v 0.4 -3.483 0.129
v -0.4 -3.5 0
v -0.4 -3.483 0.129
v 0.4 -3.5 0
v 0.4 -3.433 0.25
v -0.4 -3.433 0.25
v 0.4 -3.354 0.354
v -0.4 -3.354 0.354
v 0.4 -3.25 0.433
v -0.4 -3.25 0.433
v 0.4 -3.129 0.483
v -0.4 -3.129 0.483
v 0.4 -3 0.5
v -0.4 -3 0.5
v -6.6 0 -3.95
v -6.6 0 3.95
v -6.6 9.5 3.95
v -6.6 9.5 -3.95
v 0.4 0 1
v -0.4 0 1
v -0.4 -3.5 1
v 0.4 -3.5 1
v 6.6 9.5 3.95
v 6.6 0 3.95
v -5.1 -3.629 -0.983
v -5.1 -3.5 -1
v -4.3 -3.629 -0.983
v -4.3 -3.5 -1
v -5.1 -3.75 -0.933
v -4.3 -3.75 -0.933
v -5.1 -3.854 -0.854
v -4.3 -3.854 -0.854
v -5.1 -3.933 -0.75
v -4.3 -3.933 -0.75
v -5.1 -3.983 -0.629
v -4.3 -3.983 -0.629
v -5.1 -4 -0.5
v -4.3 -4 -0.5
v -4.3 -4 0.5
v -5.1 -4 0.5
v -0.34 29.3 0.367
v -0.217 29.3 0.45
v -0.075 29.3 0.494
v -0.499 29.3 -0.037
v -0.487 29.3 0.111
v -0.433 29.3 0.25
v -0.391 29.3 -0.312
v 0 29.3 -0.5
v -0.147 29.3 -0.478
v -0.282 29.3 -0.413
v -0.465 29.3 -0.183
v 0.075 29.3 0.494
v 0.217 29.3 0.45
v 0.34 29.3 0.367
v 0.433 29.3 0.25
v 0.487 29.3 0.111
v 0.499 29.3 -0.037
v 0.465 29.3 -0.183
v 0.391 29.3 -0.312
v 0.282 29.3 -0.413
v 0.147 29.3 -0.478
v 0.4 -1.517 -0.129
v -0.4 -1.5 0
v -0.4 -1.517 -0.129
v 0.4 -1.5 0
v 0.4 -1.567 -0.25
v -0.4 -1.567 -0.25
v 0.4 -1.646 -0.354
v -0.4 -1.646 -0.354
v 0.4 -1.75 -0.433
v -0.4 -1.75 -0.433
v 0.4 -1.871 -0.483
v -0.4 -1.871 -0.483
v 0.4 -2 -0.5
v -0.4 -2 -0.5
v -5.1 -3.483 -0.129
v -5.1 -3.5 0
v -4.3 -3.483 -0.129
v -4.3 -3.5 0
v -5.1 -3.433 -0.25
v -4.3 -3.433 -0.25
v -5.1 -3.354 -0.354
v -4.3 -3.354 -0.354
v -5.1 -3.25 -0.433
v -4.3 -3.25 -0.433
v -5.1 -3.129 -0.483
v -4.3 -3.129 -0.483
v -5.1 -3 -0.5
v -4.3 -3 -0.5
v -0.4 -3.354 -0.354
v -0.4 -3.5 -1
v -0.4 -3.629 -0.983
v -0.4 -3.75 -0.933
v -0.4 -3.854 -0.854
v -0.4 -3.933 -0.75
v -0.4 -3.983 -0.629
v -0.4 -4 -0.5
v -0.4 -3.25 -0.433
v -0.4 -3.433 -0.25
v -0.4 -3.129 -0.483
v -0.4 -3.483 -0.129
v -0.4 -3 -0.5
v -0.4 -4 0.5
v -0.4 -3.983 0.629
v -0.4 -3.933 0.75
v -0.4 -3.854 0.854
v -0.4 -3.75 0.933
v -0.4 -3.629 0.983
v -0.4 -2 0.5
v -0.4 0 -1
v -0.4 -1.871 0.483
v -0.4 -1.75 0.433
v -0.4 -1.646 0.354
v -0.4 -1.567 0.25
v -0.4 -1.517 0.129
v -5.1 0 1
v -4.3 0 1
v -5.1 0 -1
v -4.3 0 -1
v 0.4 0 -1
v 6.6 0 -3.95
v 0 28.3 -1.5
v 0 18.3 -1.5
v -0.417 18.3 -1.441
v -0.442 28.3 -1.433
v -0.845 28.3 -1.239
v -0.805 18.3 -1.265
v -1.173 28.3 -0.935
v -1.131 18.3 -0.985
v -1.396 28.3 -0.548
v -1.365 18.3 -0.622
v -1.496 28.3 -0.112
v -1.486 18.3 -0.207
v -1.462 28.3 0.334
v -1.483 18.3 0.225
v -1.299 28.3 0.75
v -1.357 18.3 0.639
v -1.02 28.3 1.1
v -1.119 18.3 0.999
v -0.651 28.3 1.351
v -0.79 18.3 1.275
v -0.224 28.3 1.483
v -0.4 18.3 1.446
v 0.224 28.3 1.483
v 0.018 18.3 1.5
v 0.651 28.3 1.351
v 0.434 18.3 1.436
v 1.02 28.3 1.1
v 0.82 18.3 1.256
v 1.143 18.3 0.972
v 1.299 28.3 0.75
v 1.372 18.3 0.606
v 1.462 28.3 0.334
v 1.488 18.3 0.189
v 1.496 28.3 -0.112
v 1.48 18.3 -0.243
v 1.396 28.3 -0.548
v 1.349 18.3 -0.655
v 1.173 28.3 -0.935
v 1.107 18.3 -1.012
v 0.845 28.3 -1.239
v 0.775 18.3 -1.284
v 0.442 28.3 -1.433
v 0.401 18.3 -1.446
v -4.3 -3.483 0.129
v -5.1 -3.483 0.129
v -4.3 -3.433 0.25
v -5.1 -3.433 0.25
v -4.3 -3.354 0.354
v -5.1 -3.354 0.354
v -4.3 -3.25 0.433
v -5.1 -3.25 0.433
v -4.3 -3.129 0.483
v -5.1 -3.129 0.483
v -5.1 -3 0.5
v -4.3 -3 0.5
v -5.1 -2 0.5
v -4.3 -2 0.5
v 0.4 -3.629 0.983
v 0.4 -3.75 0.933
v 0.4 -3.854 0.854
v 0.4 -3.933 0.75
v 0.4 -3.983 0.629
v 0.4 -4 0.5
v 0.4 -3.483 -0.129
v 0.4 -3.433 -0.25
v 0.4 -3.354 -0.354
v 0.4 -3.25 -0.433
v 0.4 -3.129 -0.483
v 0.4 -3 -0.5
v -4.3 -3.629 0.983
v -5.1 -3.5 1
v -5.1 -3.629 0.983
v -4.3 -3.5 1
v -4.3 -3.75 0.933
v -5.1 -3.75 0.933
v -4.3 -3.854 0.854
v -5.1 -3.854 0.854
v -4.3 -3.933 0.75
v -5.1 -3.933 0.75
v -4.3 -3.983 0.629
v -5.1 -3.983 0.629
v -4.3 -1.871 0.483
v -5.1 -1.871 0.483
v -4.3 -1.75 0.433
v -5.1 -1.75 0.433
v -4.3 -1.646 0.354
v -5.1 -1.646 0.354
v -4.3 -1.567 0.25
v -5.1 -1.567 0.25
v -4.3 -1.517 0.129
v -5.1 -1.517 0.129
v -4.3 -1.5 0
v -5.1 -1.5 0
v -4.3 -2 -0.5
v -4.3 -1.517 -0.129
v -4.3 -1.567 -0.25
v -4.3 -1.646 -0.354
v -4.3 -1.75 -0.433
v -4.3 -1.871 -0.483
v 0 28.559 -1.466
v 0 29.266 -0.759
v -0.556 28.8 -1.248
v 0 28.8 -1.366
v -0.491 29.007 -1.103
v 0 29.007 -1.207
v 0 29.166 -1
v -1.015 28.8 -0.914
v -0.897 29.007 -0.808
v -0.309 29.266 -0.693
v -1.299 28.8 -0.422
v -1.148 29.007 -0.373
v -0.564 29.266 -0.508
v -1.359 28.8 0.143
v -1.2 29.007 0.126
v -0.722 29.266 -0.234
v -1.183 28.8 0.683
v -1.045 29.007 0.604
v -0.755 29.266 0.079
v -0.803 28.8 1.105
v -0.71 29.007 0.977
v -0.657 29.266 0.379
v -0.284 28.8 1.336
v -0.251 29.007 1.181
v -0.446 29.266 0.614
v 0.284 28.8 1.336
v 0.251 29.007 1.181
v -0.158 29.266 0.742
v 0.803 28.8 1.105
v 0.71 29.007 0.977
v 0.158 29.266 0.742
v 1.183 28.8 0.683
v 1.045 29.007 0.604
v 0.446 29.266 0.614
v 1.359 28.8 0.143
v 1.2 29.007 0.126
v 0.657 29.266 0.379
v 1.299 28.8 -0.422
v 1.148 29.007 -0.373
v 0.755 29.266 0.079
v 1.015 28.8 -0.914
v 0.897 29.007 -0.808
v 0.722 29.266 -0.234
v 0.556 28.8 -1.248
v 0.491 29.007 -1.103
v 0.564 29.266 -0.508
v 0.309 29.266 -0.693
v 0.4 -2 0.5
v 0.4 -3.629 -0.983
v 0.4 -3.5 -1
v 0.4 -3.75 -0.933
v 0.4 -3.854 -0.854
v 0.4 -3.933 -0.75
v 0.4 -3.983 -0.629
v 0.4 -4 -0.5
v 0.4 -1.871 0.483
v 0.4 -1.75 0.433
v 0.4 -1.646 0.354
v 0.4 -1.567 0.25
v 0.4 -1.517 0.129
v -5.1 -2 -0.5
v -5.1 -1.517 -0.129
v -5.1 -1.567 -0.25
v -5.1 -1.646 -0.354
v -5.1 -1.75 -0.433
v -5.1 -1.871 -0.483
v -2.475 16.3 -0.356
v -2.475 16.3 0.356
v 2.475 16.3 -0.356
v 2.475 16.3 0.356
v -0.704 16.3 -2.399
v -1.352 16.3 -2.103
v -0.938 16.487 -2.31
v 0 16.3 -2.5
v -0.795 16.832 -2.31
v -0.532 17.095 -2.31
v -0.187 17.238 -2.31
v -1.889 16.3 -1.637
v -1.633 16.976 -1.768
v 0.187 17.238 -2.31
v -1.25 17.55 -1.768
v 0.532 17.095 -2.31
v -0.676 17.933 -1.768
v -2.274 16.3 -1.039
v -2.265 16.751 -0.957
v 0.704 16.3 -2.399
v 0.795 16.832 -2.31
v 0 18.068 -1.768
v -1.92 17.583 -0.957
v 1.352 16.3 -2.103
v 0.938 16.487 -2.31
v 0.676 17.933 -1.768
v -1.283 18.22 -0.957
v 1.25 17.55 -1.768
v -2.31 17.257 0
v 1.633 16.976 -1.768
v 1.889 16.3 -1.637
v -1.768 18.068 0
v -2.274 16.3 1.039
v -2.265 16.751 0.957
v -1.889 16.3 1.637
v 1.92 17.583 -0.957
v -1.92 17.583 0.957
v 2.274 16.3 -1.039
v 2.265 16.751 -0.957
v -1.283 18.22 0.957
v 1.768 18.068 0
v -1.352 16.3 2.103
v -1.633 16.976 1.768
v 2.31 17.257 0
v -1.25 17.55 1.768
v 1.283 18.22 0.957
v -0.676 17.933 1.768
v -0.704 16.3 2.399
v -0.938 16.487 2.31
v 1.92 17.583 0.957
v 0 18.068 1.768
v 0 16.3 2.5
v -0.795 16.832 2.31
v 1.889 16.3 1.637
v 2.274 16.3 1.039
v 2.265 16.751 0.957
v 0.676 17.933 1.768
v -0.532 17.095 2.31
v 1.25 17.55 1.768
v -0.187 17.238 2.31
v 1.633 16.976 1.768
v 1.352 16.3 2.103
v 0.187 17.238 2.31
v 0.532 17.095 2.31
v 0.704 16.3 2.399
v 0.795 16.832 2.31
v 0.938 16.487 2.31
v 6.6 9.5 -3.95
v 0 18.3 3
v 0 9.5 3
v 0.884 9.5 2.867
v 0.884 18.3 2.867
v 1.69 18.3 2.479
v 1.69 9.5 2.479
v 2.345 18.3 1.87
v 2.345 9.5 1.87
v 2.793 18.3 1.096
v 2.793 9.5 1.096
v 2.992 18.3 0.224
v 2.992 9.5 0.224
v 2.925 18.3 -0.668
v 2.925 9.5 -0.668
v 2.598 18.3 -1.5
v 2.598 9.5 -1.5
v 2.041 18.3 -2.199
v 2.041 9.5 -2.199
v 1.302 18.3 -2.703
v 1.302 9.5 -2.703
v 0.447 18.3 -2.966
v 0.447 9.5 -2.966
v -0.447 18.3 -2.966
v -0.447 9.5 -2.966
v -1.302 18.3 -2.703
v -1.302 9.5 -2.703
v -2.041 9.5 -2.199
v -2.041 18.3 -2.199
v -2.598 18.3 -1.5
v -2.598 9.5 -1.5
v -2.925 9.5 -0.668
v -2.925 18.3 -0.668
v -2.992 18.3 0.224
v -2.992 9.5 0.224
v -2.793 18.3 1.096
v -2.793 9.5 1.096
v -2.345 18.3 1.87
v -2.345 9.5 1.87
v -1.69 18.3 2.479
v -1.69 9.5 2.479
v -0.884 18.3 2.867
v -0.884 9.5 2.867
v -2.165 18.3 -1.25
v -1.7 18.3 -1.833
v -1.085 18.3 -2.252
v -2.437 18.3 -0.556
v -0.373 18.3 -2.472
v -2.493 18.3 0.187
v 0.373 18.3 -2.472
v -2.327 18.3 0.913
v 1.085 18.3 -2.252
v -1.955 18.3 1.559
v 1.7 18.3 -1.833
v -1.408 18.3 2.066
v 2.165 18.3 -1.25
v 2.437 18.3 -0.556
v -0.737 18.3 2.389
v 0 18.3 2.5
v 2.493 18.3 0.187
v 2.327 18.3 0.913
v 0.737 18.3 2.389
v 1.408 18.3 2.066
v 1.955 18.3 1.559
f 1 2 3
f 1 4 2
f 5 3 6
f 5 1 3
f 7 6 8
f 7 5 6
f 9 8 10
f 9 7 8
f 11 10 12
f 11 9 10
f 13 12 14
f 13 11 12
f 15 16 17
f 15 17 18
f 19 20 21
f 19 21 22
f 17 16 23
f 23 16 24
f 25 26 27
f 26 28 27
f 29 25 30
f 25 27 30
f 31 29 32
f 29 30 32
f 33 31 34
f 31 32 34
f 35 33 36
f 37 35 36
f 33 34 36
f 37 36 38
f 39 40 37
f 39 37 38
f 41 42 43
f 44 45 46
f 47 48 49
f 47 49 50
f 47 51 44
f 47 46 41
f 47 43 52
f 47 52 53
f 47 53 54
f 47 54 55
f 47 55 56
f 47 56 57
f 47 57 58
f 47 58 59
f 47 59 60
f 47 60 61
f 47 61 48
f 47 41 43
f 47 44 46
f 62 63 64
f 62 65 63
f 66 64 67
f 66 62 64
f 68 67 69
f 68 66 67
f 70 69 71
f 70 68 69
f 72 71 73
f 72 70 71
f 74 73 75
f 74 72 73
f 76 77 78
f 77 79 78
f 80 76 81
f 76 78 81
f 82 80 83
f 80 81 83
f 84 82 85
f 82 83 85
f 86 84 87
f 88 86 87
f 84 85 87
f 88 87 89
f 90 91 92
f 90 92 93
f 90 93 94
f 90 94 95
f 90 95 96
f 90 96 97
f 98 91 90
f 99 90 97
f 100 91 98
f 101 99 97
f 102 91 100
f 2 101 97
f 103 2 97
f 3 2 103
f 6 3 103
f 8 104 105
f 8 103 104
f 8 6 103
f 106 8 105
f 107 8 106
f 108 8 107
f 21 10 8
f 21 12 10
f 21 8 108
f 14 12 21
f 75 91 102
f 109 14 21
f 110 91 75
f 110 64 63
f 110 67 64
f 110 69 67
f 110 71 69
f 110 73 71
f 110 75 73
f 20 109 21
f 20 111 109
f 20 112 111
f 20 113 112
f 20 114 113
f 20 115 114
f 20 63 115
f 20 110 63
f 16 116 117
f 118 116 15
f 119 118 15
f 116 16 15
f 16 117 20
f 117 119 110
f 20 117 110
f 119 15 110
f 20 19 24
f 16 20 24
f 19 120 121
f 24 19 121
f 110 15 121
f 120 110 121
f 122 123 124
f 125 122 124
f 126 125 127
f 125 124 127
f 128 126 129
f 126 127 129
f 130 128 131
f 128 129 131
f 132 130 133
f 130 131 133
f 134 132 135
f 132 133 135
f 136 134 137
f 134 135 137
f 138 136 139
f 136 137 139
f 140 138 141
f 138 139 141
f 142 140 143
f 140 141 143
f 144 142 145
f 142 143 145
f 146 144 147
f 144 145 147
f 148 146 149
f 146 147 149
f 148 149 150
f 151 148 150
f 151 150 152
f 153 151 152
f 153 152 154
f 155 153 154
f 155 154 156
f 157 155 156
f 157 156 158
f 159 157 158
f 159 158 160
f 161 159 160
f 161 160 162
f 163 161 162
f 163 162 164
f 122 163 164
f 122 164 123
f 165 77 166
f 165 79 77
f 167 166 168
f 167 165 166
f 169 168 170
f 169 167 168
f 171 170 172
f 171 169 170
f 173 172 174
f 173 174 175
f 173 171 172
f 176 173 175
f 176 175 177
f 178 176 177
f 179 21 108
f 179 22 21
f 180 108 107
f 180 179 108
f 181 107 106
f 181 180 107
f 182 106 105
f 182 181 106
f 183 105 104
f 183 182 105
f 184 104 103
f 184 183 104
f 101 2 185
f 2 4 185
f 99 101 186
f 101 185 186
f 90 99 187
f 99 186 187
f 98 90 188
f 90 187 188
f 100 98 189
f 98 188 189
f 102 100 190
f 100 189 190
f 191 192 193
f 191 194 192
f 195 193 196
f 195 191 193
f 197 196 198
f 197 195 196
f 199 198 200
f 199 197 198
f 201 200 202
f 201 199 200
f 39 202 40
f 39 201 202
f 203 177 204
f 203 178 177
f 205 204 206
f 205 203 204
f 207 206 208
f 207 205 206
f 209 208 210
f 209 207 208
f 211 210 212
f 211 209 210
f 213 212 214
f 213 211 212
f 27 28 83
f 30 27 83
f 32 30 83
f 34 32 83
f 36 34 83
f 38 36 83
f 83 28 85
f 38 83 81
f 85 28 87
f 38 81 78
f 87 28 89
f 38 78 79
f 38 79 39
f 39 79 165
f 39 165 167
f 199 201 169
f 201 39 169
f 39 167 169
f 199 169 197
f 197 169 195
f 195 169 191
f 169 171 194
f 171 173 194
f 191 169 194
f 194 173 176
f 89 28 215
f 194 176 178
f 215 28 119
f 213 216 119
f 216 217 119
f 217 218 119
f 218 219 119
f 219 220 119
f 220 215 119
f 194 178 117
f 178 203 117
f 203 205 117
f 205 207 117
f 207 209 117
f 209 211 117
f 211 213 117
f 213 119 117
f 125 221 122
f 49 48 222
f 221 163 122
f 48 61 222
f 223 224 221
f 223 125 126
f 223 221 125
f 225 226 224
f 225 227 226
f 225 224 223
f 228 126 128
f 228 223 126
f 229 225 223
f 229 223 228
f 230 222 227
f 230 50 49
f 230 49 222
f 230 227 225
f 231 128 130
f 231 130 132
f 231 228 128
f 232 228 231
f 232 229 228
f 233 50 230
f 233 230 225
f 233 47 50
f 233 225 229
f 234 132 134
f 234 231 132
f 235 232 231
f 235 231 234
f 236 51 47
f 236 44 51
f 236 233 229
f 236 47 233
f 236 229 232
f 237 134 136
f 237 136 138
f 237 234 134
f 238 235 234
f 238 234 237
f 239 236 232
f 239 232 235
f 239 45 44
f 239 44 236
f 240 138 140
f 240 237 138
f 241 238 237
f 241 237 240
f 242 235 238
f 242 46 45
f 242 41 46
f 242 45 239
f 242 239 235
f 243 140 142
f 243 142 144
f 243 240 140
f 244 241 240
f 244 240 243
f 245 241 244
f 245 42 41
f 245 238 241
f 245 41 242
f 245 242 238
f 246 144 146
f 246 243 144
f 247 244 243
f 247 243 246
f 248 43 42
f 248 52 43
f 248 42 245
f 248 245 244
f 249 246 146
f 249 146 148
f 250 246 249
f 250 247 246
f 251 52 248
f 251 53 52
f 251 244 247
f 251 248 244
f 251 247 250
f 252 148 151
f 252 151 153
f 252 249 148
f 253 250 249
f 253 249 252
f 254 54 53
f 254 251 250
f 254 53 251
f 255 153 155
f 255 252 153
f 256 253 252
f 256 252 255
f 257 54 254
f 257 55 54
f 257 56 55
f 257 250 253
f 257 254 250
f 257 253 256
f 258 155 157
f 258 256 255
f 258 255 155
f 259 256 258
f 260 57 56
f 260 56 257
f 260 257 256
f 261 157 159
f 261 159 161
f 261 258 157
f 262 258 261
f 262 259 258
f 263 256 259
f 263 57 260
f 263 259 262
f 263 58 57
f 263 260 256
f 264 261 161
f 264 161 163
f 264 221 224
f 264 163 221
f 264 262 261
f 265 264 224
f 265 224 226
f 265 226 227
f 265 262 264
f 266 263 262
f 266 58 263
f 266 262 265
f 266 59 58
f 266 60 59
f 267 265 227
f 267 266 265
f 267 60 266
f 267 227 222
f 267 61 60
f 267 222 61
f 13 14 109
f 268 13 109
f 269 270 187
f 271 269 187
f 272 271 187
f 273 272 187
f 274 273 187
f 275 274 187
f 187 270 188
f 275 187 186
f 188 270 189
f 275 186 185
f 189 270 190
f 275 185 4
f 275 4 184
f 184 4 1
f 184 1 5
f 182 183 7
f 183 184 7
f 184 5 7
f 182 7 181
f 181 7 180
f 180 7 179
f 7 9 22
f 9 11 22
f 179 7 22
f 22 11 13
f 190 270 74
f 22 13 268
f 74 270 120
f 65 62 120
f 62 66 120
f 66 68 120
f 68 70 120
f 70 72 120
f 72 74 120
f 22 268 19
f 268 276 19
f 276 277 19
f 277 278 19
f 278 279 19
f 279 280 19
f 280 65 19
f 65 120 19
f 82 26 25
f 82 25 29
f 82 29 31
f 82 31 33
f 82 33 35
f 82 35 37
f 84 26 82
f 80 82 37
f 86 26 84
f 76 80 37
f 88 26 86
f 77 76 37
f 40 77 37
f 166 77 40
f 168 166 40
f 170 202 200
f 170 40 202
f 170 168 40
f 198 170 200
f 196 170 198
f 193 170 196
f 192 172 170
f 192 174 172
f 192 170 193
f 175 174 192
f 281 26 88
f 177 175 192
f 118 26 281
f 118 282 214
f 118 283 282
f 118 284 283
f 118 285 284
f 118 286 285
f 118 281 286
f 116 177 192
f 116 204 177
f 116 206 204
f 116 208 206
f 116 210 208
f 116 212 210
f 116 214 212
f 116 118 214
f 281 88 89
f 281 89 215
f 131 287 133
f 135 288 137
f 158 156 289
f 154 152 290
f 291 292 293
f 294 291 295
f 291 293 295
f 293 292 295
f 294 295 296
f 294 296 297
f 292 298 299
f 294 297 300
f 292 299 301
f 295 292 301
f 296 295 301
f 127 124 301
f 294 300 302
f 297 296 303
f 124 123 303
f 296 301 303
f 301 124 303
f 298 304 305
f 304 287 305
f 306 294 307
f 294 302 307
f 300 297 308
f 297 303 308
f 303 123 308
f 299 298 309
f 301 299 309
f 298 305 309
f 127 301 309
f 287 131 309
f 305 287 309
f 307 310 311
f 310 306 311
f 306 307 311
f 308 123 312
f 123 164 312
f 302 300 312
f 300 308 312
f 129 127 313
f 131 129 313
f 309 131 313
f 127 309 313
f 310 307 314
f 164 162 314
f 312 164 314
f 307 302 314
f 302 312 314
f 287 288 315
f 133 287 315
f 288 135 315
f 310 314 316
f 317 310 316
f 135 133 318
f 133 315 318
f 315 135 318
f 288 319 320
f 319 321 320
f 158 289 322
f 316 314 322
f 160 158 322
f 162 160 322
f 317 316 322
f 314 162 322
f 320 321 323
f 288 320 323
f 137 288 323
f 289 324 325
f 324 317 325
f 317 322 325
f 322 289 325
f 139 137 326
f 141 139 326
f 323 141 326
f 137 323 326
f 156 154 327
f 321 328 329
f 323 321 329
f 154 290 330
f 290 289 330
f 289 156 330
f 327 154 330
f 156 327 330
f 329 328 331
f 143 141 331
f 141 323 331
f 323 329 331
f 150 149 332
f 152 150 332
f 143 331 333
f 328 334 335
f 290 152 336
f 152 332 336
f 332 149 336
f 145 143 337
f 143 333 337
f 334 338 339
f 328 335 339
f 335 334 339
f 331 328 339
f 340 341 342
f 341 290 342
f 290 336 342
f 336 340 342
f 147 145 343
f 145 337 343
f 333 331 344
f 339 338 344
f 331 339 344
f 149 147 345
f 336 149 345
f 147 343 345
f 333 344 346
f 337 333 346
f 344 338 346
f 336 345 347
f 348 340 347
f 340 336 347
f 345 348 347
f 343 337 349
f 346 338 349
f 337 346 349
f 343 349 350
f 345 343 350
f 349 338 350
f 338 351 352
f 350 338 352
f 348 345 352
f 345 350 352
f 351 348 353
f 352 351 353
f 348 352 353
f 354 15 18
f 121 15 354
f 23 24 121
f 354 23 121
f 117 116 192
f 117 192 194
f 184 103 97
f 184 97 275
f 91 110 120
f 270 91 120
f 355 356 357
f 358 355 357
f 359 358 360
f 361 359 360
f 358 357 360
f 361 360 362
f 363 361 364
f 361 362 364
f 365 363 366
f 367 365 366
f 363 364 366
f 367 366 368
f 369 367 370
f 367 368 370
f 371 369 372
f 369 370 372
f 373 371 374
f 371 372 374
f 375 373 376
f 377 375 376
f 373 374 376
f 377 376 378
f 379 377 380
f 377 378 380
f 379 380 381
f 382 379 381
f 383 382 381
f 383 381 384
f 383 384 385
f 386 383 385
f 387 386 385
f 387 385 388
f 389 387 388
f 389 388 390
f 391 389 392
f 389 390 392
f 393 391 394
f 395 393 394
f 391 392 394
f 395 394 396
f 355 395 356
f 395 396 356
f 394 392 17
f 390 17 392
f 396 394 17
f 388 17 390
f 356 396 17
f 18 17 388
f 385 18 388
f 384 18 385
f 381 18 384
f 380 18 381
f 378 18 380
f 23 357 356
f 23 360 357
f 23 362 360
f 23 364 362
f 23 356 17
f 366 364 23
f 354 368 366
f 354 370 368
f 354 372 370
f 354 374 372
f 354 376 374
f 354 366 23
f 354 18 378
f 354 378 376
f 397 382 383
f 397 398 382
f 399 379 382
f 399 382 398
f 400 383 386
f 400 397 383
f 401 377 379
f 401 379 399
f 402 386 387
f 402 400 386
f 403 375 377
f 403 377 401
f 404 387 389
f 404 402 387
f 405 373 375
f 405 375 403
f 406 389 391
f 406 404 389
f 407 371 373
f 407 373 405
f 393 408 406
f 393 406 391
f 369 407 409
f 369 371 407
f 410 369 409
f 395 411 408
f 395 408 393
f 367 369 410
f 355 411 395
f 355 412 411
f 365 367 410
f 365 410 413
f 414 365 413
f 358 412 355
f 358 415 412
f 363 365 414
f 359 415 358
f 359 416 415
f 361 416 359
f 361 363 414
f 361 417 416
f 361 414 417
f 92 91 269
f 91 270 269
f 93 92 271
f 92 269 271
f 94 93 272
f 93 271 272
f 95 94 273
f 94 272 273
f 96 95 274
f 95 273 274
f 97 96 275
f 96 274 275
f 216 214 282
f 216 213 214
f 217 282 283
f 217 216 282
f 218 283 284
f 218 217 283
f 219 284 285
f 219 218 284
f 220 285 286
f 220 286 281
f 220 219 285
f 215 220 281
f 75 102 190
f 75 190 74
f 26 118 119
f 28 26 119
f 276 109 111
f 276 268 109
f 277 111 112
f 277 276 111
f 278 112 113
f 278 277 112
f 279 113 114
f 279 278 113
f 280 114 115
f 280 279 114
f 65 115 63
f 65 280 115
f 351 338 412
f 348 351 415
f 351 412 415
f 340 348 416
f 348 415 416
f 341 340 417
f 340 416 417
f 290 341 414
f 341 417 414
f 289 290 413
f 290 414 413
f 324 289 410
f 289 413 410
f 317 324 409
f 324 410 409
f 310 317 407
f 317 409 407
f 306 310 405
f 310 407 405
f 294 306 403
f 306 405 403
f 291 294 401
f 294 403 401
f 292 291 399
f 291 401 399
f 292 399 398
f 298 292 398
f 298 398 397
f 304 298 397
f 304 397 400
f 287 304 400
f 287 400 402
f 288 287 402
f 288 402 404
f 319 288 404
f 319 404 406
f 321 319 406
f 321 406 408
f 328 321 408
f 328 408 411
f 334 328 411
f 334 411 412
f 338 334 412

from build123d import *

# Parameters (mm, degrees)
SKETCH1_W           = 13.2
SKETCH1_H           = 7.9
BOSS_EXTRUDE1_DEPTH = 9.5
SKETCH2_R           = 3
BOSS_EXTRUDE2_DEPTH = 8.8
SKETCH4_R           = 2.5
CUT_EXTRUDE1_DEPTH  = 2
SKETCH5_R           = 1.5
BOSS_EXTRUDE3_DEPTH = 13
REVOLVE2_ANGLE      = 180
FILLET1_R           = 1
SKETCH6_W           = 0.8
SKETCH6_H           = 2
BOSS_EXTRUDE4_DEPTH = 4
SKETCH7_W           = 1
SKETCH7_H           = 2
CUT_EXTRUDE3_DEPTH  = 32.795951
FILLET3_R           = 0.5


with BuildPart() as part:
    # Sketch1 → Boss-Extrude1 (new body)
    with BuildSketch(Plane(origin=(0, 0, 0), x_dir=(1, 0, 0), z_dir=(0, 1, 0))):
        Rectangle(SKETCH1_W, SKETCH1_H)
    extrude(amount=BOSS_EXTRUDE1_DEPTH)

    # Sketch2 → Boss-Extrude2 (add)
    with BuildSketch(Plane(origin=(0, 9.5, 0), x_dir=(1, 0, 0), z_dir=(0, 1, 0))):
        with Locations(Location((0, 0, 0), (0, 0, 270))):
            Circle(SKETCH2_R)
    extrude(amount=BOSS_EXTRUDE2_DEPTH)

    # Sketch4 → Cut-Extrude1 (cut)
    with BuildSketch(Plane(origin=(0, 18.3, 0), x_dir=(1, 0, 0), z_dir=(0, 1, 0))):
        with Locations(Location((0, 0, 0), (0, 0, 270))):
            Circle(SKETCH4_R)
    extrude(amount=-CUT_EXTRUDE1_DEPTH, mode=Mode.SUBTRACT)

    # Sketch5 → Boss-Extrude3 (add)
    with BuildSketch(Plane(origin=(0, 16.3, 0), x_dir=(1, 0, 0), z_dir=(0, 1, 0))):
        with Locations(Location((0, 0, 0), (0, 0, 90))):
            Circle(SKETCH5_R)
    extrude(amount=BOSS_EXTRUDE3_DEPTH)

    # Sketch3 → Revolve2 (revolve)
    with BuildSketch(Plane(origin=(0, 16.3, 0), x_dir=(1, 0, 0), z_dir=(0, 1, 0))):
        with BuildLine():
            Line((0, -2.5), (0, 2.5))
            ThreePointArc((0, 2.5), (-2.5, 0), (0, -2.5))
        make_face()
    revolve(axis=Axis((0, 16.3, 3), (0, 0, -1)), revolution_arc=REVOLVE2_ANGLE)

    # Fillet1
    fillet1_edges = [part.edges().sort_by_distance(p)[0] for p in [
        (0, 29.3, 1.5),
    ]]
    fillet(fillet1_edges, radius=FILLET1_R)

    # Sketch6 → Boss-Extrude4 (add)
    with BuildSketch(Plane.XZ):
        with Locations((-4.7, 0)):
            Rectangle(SKETCH6_W, SKETCH6_H)
        Rectangle(SKETCH6_W, SKETCH6_H)
    extrude(amount=BOSS_EXTRUDE4_DEPTH)

    # Sketch7 → Cut-Extrude3 (cut, through all)
    with BuildSketch(Plane.ZY.offset(5.1)):
        with Locations((0, -2.5)):
            Rectangle(SKETCH7_W, SKETCH7_H)
    extrude(amount=-CUT_EXTRUDE3_DEPTH, mode=Mode.SUBTRACT)

    # Fillet3
    fillet3_edges = [part.edges().sort_by_distance(p)[0] for p in [
        (0, -4, 1),
        (0, -4, -1),
        (-4.7, -4, -1),
        (-4.7, -4, 1),
        (0, -3.5, -0.5),
        (0, -1.5, -0.5),
        (0, -3.5, 0.5),
        (0, -1.5, 0.5),
        (-4.7, -1.5, 0.5),
        (-4.7, -1.5, -0.5),
        (-4.7, -3.5, 0.5),
        (-4.7, -3.5, -0.5),
    ]]
    fillet(fillet3_edges, radius=FILLET3_R - 0.0001)  # a hair under: the kernel refuses the full size


solid = part.part
